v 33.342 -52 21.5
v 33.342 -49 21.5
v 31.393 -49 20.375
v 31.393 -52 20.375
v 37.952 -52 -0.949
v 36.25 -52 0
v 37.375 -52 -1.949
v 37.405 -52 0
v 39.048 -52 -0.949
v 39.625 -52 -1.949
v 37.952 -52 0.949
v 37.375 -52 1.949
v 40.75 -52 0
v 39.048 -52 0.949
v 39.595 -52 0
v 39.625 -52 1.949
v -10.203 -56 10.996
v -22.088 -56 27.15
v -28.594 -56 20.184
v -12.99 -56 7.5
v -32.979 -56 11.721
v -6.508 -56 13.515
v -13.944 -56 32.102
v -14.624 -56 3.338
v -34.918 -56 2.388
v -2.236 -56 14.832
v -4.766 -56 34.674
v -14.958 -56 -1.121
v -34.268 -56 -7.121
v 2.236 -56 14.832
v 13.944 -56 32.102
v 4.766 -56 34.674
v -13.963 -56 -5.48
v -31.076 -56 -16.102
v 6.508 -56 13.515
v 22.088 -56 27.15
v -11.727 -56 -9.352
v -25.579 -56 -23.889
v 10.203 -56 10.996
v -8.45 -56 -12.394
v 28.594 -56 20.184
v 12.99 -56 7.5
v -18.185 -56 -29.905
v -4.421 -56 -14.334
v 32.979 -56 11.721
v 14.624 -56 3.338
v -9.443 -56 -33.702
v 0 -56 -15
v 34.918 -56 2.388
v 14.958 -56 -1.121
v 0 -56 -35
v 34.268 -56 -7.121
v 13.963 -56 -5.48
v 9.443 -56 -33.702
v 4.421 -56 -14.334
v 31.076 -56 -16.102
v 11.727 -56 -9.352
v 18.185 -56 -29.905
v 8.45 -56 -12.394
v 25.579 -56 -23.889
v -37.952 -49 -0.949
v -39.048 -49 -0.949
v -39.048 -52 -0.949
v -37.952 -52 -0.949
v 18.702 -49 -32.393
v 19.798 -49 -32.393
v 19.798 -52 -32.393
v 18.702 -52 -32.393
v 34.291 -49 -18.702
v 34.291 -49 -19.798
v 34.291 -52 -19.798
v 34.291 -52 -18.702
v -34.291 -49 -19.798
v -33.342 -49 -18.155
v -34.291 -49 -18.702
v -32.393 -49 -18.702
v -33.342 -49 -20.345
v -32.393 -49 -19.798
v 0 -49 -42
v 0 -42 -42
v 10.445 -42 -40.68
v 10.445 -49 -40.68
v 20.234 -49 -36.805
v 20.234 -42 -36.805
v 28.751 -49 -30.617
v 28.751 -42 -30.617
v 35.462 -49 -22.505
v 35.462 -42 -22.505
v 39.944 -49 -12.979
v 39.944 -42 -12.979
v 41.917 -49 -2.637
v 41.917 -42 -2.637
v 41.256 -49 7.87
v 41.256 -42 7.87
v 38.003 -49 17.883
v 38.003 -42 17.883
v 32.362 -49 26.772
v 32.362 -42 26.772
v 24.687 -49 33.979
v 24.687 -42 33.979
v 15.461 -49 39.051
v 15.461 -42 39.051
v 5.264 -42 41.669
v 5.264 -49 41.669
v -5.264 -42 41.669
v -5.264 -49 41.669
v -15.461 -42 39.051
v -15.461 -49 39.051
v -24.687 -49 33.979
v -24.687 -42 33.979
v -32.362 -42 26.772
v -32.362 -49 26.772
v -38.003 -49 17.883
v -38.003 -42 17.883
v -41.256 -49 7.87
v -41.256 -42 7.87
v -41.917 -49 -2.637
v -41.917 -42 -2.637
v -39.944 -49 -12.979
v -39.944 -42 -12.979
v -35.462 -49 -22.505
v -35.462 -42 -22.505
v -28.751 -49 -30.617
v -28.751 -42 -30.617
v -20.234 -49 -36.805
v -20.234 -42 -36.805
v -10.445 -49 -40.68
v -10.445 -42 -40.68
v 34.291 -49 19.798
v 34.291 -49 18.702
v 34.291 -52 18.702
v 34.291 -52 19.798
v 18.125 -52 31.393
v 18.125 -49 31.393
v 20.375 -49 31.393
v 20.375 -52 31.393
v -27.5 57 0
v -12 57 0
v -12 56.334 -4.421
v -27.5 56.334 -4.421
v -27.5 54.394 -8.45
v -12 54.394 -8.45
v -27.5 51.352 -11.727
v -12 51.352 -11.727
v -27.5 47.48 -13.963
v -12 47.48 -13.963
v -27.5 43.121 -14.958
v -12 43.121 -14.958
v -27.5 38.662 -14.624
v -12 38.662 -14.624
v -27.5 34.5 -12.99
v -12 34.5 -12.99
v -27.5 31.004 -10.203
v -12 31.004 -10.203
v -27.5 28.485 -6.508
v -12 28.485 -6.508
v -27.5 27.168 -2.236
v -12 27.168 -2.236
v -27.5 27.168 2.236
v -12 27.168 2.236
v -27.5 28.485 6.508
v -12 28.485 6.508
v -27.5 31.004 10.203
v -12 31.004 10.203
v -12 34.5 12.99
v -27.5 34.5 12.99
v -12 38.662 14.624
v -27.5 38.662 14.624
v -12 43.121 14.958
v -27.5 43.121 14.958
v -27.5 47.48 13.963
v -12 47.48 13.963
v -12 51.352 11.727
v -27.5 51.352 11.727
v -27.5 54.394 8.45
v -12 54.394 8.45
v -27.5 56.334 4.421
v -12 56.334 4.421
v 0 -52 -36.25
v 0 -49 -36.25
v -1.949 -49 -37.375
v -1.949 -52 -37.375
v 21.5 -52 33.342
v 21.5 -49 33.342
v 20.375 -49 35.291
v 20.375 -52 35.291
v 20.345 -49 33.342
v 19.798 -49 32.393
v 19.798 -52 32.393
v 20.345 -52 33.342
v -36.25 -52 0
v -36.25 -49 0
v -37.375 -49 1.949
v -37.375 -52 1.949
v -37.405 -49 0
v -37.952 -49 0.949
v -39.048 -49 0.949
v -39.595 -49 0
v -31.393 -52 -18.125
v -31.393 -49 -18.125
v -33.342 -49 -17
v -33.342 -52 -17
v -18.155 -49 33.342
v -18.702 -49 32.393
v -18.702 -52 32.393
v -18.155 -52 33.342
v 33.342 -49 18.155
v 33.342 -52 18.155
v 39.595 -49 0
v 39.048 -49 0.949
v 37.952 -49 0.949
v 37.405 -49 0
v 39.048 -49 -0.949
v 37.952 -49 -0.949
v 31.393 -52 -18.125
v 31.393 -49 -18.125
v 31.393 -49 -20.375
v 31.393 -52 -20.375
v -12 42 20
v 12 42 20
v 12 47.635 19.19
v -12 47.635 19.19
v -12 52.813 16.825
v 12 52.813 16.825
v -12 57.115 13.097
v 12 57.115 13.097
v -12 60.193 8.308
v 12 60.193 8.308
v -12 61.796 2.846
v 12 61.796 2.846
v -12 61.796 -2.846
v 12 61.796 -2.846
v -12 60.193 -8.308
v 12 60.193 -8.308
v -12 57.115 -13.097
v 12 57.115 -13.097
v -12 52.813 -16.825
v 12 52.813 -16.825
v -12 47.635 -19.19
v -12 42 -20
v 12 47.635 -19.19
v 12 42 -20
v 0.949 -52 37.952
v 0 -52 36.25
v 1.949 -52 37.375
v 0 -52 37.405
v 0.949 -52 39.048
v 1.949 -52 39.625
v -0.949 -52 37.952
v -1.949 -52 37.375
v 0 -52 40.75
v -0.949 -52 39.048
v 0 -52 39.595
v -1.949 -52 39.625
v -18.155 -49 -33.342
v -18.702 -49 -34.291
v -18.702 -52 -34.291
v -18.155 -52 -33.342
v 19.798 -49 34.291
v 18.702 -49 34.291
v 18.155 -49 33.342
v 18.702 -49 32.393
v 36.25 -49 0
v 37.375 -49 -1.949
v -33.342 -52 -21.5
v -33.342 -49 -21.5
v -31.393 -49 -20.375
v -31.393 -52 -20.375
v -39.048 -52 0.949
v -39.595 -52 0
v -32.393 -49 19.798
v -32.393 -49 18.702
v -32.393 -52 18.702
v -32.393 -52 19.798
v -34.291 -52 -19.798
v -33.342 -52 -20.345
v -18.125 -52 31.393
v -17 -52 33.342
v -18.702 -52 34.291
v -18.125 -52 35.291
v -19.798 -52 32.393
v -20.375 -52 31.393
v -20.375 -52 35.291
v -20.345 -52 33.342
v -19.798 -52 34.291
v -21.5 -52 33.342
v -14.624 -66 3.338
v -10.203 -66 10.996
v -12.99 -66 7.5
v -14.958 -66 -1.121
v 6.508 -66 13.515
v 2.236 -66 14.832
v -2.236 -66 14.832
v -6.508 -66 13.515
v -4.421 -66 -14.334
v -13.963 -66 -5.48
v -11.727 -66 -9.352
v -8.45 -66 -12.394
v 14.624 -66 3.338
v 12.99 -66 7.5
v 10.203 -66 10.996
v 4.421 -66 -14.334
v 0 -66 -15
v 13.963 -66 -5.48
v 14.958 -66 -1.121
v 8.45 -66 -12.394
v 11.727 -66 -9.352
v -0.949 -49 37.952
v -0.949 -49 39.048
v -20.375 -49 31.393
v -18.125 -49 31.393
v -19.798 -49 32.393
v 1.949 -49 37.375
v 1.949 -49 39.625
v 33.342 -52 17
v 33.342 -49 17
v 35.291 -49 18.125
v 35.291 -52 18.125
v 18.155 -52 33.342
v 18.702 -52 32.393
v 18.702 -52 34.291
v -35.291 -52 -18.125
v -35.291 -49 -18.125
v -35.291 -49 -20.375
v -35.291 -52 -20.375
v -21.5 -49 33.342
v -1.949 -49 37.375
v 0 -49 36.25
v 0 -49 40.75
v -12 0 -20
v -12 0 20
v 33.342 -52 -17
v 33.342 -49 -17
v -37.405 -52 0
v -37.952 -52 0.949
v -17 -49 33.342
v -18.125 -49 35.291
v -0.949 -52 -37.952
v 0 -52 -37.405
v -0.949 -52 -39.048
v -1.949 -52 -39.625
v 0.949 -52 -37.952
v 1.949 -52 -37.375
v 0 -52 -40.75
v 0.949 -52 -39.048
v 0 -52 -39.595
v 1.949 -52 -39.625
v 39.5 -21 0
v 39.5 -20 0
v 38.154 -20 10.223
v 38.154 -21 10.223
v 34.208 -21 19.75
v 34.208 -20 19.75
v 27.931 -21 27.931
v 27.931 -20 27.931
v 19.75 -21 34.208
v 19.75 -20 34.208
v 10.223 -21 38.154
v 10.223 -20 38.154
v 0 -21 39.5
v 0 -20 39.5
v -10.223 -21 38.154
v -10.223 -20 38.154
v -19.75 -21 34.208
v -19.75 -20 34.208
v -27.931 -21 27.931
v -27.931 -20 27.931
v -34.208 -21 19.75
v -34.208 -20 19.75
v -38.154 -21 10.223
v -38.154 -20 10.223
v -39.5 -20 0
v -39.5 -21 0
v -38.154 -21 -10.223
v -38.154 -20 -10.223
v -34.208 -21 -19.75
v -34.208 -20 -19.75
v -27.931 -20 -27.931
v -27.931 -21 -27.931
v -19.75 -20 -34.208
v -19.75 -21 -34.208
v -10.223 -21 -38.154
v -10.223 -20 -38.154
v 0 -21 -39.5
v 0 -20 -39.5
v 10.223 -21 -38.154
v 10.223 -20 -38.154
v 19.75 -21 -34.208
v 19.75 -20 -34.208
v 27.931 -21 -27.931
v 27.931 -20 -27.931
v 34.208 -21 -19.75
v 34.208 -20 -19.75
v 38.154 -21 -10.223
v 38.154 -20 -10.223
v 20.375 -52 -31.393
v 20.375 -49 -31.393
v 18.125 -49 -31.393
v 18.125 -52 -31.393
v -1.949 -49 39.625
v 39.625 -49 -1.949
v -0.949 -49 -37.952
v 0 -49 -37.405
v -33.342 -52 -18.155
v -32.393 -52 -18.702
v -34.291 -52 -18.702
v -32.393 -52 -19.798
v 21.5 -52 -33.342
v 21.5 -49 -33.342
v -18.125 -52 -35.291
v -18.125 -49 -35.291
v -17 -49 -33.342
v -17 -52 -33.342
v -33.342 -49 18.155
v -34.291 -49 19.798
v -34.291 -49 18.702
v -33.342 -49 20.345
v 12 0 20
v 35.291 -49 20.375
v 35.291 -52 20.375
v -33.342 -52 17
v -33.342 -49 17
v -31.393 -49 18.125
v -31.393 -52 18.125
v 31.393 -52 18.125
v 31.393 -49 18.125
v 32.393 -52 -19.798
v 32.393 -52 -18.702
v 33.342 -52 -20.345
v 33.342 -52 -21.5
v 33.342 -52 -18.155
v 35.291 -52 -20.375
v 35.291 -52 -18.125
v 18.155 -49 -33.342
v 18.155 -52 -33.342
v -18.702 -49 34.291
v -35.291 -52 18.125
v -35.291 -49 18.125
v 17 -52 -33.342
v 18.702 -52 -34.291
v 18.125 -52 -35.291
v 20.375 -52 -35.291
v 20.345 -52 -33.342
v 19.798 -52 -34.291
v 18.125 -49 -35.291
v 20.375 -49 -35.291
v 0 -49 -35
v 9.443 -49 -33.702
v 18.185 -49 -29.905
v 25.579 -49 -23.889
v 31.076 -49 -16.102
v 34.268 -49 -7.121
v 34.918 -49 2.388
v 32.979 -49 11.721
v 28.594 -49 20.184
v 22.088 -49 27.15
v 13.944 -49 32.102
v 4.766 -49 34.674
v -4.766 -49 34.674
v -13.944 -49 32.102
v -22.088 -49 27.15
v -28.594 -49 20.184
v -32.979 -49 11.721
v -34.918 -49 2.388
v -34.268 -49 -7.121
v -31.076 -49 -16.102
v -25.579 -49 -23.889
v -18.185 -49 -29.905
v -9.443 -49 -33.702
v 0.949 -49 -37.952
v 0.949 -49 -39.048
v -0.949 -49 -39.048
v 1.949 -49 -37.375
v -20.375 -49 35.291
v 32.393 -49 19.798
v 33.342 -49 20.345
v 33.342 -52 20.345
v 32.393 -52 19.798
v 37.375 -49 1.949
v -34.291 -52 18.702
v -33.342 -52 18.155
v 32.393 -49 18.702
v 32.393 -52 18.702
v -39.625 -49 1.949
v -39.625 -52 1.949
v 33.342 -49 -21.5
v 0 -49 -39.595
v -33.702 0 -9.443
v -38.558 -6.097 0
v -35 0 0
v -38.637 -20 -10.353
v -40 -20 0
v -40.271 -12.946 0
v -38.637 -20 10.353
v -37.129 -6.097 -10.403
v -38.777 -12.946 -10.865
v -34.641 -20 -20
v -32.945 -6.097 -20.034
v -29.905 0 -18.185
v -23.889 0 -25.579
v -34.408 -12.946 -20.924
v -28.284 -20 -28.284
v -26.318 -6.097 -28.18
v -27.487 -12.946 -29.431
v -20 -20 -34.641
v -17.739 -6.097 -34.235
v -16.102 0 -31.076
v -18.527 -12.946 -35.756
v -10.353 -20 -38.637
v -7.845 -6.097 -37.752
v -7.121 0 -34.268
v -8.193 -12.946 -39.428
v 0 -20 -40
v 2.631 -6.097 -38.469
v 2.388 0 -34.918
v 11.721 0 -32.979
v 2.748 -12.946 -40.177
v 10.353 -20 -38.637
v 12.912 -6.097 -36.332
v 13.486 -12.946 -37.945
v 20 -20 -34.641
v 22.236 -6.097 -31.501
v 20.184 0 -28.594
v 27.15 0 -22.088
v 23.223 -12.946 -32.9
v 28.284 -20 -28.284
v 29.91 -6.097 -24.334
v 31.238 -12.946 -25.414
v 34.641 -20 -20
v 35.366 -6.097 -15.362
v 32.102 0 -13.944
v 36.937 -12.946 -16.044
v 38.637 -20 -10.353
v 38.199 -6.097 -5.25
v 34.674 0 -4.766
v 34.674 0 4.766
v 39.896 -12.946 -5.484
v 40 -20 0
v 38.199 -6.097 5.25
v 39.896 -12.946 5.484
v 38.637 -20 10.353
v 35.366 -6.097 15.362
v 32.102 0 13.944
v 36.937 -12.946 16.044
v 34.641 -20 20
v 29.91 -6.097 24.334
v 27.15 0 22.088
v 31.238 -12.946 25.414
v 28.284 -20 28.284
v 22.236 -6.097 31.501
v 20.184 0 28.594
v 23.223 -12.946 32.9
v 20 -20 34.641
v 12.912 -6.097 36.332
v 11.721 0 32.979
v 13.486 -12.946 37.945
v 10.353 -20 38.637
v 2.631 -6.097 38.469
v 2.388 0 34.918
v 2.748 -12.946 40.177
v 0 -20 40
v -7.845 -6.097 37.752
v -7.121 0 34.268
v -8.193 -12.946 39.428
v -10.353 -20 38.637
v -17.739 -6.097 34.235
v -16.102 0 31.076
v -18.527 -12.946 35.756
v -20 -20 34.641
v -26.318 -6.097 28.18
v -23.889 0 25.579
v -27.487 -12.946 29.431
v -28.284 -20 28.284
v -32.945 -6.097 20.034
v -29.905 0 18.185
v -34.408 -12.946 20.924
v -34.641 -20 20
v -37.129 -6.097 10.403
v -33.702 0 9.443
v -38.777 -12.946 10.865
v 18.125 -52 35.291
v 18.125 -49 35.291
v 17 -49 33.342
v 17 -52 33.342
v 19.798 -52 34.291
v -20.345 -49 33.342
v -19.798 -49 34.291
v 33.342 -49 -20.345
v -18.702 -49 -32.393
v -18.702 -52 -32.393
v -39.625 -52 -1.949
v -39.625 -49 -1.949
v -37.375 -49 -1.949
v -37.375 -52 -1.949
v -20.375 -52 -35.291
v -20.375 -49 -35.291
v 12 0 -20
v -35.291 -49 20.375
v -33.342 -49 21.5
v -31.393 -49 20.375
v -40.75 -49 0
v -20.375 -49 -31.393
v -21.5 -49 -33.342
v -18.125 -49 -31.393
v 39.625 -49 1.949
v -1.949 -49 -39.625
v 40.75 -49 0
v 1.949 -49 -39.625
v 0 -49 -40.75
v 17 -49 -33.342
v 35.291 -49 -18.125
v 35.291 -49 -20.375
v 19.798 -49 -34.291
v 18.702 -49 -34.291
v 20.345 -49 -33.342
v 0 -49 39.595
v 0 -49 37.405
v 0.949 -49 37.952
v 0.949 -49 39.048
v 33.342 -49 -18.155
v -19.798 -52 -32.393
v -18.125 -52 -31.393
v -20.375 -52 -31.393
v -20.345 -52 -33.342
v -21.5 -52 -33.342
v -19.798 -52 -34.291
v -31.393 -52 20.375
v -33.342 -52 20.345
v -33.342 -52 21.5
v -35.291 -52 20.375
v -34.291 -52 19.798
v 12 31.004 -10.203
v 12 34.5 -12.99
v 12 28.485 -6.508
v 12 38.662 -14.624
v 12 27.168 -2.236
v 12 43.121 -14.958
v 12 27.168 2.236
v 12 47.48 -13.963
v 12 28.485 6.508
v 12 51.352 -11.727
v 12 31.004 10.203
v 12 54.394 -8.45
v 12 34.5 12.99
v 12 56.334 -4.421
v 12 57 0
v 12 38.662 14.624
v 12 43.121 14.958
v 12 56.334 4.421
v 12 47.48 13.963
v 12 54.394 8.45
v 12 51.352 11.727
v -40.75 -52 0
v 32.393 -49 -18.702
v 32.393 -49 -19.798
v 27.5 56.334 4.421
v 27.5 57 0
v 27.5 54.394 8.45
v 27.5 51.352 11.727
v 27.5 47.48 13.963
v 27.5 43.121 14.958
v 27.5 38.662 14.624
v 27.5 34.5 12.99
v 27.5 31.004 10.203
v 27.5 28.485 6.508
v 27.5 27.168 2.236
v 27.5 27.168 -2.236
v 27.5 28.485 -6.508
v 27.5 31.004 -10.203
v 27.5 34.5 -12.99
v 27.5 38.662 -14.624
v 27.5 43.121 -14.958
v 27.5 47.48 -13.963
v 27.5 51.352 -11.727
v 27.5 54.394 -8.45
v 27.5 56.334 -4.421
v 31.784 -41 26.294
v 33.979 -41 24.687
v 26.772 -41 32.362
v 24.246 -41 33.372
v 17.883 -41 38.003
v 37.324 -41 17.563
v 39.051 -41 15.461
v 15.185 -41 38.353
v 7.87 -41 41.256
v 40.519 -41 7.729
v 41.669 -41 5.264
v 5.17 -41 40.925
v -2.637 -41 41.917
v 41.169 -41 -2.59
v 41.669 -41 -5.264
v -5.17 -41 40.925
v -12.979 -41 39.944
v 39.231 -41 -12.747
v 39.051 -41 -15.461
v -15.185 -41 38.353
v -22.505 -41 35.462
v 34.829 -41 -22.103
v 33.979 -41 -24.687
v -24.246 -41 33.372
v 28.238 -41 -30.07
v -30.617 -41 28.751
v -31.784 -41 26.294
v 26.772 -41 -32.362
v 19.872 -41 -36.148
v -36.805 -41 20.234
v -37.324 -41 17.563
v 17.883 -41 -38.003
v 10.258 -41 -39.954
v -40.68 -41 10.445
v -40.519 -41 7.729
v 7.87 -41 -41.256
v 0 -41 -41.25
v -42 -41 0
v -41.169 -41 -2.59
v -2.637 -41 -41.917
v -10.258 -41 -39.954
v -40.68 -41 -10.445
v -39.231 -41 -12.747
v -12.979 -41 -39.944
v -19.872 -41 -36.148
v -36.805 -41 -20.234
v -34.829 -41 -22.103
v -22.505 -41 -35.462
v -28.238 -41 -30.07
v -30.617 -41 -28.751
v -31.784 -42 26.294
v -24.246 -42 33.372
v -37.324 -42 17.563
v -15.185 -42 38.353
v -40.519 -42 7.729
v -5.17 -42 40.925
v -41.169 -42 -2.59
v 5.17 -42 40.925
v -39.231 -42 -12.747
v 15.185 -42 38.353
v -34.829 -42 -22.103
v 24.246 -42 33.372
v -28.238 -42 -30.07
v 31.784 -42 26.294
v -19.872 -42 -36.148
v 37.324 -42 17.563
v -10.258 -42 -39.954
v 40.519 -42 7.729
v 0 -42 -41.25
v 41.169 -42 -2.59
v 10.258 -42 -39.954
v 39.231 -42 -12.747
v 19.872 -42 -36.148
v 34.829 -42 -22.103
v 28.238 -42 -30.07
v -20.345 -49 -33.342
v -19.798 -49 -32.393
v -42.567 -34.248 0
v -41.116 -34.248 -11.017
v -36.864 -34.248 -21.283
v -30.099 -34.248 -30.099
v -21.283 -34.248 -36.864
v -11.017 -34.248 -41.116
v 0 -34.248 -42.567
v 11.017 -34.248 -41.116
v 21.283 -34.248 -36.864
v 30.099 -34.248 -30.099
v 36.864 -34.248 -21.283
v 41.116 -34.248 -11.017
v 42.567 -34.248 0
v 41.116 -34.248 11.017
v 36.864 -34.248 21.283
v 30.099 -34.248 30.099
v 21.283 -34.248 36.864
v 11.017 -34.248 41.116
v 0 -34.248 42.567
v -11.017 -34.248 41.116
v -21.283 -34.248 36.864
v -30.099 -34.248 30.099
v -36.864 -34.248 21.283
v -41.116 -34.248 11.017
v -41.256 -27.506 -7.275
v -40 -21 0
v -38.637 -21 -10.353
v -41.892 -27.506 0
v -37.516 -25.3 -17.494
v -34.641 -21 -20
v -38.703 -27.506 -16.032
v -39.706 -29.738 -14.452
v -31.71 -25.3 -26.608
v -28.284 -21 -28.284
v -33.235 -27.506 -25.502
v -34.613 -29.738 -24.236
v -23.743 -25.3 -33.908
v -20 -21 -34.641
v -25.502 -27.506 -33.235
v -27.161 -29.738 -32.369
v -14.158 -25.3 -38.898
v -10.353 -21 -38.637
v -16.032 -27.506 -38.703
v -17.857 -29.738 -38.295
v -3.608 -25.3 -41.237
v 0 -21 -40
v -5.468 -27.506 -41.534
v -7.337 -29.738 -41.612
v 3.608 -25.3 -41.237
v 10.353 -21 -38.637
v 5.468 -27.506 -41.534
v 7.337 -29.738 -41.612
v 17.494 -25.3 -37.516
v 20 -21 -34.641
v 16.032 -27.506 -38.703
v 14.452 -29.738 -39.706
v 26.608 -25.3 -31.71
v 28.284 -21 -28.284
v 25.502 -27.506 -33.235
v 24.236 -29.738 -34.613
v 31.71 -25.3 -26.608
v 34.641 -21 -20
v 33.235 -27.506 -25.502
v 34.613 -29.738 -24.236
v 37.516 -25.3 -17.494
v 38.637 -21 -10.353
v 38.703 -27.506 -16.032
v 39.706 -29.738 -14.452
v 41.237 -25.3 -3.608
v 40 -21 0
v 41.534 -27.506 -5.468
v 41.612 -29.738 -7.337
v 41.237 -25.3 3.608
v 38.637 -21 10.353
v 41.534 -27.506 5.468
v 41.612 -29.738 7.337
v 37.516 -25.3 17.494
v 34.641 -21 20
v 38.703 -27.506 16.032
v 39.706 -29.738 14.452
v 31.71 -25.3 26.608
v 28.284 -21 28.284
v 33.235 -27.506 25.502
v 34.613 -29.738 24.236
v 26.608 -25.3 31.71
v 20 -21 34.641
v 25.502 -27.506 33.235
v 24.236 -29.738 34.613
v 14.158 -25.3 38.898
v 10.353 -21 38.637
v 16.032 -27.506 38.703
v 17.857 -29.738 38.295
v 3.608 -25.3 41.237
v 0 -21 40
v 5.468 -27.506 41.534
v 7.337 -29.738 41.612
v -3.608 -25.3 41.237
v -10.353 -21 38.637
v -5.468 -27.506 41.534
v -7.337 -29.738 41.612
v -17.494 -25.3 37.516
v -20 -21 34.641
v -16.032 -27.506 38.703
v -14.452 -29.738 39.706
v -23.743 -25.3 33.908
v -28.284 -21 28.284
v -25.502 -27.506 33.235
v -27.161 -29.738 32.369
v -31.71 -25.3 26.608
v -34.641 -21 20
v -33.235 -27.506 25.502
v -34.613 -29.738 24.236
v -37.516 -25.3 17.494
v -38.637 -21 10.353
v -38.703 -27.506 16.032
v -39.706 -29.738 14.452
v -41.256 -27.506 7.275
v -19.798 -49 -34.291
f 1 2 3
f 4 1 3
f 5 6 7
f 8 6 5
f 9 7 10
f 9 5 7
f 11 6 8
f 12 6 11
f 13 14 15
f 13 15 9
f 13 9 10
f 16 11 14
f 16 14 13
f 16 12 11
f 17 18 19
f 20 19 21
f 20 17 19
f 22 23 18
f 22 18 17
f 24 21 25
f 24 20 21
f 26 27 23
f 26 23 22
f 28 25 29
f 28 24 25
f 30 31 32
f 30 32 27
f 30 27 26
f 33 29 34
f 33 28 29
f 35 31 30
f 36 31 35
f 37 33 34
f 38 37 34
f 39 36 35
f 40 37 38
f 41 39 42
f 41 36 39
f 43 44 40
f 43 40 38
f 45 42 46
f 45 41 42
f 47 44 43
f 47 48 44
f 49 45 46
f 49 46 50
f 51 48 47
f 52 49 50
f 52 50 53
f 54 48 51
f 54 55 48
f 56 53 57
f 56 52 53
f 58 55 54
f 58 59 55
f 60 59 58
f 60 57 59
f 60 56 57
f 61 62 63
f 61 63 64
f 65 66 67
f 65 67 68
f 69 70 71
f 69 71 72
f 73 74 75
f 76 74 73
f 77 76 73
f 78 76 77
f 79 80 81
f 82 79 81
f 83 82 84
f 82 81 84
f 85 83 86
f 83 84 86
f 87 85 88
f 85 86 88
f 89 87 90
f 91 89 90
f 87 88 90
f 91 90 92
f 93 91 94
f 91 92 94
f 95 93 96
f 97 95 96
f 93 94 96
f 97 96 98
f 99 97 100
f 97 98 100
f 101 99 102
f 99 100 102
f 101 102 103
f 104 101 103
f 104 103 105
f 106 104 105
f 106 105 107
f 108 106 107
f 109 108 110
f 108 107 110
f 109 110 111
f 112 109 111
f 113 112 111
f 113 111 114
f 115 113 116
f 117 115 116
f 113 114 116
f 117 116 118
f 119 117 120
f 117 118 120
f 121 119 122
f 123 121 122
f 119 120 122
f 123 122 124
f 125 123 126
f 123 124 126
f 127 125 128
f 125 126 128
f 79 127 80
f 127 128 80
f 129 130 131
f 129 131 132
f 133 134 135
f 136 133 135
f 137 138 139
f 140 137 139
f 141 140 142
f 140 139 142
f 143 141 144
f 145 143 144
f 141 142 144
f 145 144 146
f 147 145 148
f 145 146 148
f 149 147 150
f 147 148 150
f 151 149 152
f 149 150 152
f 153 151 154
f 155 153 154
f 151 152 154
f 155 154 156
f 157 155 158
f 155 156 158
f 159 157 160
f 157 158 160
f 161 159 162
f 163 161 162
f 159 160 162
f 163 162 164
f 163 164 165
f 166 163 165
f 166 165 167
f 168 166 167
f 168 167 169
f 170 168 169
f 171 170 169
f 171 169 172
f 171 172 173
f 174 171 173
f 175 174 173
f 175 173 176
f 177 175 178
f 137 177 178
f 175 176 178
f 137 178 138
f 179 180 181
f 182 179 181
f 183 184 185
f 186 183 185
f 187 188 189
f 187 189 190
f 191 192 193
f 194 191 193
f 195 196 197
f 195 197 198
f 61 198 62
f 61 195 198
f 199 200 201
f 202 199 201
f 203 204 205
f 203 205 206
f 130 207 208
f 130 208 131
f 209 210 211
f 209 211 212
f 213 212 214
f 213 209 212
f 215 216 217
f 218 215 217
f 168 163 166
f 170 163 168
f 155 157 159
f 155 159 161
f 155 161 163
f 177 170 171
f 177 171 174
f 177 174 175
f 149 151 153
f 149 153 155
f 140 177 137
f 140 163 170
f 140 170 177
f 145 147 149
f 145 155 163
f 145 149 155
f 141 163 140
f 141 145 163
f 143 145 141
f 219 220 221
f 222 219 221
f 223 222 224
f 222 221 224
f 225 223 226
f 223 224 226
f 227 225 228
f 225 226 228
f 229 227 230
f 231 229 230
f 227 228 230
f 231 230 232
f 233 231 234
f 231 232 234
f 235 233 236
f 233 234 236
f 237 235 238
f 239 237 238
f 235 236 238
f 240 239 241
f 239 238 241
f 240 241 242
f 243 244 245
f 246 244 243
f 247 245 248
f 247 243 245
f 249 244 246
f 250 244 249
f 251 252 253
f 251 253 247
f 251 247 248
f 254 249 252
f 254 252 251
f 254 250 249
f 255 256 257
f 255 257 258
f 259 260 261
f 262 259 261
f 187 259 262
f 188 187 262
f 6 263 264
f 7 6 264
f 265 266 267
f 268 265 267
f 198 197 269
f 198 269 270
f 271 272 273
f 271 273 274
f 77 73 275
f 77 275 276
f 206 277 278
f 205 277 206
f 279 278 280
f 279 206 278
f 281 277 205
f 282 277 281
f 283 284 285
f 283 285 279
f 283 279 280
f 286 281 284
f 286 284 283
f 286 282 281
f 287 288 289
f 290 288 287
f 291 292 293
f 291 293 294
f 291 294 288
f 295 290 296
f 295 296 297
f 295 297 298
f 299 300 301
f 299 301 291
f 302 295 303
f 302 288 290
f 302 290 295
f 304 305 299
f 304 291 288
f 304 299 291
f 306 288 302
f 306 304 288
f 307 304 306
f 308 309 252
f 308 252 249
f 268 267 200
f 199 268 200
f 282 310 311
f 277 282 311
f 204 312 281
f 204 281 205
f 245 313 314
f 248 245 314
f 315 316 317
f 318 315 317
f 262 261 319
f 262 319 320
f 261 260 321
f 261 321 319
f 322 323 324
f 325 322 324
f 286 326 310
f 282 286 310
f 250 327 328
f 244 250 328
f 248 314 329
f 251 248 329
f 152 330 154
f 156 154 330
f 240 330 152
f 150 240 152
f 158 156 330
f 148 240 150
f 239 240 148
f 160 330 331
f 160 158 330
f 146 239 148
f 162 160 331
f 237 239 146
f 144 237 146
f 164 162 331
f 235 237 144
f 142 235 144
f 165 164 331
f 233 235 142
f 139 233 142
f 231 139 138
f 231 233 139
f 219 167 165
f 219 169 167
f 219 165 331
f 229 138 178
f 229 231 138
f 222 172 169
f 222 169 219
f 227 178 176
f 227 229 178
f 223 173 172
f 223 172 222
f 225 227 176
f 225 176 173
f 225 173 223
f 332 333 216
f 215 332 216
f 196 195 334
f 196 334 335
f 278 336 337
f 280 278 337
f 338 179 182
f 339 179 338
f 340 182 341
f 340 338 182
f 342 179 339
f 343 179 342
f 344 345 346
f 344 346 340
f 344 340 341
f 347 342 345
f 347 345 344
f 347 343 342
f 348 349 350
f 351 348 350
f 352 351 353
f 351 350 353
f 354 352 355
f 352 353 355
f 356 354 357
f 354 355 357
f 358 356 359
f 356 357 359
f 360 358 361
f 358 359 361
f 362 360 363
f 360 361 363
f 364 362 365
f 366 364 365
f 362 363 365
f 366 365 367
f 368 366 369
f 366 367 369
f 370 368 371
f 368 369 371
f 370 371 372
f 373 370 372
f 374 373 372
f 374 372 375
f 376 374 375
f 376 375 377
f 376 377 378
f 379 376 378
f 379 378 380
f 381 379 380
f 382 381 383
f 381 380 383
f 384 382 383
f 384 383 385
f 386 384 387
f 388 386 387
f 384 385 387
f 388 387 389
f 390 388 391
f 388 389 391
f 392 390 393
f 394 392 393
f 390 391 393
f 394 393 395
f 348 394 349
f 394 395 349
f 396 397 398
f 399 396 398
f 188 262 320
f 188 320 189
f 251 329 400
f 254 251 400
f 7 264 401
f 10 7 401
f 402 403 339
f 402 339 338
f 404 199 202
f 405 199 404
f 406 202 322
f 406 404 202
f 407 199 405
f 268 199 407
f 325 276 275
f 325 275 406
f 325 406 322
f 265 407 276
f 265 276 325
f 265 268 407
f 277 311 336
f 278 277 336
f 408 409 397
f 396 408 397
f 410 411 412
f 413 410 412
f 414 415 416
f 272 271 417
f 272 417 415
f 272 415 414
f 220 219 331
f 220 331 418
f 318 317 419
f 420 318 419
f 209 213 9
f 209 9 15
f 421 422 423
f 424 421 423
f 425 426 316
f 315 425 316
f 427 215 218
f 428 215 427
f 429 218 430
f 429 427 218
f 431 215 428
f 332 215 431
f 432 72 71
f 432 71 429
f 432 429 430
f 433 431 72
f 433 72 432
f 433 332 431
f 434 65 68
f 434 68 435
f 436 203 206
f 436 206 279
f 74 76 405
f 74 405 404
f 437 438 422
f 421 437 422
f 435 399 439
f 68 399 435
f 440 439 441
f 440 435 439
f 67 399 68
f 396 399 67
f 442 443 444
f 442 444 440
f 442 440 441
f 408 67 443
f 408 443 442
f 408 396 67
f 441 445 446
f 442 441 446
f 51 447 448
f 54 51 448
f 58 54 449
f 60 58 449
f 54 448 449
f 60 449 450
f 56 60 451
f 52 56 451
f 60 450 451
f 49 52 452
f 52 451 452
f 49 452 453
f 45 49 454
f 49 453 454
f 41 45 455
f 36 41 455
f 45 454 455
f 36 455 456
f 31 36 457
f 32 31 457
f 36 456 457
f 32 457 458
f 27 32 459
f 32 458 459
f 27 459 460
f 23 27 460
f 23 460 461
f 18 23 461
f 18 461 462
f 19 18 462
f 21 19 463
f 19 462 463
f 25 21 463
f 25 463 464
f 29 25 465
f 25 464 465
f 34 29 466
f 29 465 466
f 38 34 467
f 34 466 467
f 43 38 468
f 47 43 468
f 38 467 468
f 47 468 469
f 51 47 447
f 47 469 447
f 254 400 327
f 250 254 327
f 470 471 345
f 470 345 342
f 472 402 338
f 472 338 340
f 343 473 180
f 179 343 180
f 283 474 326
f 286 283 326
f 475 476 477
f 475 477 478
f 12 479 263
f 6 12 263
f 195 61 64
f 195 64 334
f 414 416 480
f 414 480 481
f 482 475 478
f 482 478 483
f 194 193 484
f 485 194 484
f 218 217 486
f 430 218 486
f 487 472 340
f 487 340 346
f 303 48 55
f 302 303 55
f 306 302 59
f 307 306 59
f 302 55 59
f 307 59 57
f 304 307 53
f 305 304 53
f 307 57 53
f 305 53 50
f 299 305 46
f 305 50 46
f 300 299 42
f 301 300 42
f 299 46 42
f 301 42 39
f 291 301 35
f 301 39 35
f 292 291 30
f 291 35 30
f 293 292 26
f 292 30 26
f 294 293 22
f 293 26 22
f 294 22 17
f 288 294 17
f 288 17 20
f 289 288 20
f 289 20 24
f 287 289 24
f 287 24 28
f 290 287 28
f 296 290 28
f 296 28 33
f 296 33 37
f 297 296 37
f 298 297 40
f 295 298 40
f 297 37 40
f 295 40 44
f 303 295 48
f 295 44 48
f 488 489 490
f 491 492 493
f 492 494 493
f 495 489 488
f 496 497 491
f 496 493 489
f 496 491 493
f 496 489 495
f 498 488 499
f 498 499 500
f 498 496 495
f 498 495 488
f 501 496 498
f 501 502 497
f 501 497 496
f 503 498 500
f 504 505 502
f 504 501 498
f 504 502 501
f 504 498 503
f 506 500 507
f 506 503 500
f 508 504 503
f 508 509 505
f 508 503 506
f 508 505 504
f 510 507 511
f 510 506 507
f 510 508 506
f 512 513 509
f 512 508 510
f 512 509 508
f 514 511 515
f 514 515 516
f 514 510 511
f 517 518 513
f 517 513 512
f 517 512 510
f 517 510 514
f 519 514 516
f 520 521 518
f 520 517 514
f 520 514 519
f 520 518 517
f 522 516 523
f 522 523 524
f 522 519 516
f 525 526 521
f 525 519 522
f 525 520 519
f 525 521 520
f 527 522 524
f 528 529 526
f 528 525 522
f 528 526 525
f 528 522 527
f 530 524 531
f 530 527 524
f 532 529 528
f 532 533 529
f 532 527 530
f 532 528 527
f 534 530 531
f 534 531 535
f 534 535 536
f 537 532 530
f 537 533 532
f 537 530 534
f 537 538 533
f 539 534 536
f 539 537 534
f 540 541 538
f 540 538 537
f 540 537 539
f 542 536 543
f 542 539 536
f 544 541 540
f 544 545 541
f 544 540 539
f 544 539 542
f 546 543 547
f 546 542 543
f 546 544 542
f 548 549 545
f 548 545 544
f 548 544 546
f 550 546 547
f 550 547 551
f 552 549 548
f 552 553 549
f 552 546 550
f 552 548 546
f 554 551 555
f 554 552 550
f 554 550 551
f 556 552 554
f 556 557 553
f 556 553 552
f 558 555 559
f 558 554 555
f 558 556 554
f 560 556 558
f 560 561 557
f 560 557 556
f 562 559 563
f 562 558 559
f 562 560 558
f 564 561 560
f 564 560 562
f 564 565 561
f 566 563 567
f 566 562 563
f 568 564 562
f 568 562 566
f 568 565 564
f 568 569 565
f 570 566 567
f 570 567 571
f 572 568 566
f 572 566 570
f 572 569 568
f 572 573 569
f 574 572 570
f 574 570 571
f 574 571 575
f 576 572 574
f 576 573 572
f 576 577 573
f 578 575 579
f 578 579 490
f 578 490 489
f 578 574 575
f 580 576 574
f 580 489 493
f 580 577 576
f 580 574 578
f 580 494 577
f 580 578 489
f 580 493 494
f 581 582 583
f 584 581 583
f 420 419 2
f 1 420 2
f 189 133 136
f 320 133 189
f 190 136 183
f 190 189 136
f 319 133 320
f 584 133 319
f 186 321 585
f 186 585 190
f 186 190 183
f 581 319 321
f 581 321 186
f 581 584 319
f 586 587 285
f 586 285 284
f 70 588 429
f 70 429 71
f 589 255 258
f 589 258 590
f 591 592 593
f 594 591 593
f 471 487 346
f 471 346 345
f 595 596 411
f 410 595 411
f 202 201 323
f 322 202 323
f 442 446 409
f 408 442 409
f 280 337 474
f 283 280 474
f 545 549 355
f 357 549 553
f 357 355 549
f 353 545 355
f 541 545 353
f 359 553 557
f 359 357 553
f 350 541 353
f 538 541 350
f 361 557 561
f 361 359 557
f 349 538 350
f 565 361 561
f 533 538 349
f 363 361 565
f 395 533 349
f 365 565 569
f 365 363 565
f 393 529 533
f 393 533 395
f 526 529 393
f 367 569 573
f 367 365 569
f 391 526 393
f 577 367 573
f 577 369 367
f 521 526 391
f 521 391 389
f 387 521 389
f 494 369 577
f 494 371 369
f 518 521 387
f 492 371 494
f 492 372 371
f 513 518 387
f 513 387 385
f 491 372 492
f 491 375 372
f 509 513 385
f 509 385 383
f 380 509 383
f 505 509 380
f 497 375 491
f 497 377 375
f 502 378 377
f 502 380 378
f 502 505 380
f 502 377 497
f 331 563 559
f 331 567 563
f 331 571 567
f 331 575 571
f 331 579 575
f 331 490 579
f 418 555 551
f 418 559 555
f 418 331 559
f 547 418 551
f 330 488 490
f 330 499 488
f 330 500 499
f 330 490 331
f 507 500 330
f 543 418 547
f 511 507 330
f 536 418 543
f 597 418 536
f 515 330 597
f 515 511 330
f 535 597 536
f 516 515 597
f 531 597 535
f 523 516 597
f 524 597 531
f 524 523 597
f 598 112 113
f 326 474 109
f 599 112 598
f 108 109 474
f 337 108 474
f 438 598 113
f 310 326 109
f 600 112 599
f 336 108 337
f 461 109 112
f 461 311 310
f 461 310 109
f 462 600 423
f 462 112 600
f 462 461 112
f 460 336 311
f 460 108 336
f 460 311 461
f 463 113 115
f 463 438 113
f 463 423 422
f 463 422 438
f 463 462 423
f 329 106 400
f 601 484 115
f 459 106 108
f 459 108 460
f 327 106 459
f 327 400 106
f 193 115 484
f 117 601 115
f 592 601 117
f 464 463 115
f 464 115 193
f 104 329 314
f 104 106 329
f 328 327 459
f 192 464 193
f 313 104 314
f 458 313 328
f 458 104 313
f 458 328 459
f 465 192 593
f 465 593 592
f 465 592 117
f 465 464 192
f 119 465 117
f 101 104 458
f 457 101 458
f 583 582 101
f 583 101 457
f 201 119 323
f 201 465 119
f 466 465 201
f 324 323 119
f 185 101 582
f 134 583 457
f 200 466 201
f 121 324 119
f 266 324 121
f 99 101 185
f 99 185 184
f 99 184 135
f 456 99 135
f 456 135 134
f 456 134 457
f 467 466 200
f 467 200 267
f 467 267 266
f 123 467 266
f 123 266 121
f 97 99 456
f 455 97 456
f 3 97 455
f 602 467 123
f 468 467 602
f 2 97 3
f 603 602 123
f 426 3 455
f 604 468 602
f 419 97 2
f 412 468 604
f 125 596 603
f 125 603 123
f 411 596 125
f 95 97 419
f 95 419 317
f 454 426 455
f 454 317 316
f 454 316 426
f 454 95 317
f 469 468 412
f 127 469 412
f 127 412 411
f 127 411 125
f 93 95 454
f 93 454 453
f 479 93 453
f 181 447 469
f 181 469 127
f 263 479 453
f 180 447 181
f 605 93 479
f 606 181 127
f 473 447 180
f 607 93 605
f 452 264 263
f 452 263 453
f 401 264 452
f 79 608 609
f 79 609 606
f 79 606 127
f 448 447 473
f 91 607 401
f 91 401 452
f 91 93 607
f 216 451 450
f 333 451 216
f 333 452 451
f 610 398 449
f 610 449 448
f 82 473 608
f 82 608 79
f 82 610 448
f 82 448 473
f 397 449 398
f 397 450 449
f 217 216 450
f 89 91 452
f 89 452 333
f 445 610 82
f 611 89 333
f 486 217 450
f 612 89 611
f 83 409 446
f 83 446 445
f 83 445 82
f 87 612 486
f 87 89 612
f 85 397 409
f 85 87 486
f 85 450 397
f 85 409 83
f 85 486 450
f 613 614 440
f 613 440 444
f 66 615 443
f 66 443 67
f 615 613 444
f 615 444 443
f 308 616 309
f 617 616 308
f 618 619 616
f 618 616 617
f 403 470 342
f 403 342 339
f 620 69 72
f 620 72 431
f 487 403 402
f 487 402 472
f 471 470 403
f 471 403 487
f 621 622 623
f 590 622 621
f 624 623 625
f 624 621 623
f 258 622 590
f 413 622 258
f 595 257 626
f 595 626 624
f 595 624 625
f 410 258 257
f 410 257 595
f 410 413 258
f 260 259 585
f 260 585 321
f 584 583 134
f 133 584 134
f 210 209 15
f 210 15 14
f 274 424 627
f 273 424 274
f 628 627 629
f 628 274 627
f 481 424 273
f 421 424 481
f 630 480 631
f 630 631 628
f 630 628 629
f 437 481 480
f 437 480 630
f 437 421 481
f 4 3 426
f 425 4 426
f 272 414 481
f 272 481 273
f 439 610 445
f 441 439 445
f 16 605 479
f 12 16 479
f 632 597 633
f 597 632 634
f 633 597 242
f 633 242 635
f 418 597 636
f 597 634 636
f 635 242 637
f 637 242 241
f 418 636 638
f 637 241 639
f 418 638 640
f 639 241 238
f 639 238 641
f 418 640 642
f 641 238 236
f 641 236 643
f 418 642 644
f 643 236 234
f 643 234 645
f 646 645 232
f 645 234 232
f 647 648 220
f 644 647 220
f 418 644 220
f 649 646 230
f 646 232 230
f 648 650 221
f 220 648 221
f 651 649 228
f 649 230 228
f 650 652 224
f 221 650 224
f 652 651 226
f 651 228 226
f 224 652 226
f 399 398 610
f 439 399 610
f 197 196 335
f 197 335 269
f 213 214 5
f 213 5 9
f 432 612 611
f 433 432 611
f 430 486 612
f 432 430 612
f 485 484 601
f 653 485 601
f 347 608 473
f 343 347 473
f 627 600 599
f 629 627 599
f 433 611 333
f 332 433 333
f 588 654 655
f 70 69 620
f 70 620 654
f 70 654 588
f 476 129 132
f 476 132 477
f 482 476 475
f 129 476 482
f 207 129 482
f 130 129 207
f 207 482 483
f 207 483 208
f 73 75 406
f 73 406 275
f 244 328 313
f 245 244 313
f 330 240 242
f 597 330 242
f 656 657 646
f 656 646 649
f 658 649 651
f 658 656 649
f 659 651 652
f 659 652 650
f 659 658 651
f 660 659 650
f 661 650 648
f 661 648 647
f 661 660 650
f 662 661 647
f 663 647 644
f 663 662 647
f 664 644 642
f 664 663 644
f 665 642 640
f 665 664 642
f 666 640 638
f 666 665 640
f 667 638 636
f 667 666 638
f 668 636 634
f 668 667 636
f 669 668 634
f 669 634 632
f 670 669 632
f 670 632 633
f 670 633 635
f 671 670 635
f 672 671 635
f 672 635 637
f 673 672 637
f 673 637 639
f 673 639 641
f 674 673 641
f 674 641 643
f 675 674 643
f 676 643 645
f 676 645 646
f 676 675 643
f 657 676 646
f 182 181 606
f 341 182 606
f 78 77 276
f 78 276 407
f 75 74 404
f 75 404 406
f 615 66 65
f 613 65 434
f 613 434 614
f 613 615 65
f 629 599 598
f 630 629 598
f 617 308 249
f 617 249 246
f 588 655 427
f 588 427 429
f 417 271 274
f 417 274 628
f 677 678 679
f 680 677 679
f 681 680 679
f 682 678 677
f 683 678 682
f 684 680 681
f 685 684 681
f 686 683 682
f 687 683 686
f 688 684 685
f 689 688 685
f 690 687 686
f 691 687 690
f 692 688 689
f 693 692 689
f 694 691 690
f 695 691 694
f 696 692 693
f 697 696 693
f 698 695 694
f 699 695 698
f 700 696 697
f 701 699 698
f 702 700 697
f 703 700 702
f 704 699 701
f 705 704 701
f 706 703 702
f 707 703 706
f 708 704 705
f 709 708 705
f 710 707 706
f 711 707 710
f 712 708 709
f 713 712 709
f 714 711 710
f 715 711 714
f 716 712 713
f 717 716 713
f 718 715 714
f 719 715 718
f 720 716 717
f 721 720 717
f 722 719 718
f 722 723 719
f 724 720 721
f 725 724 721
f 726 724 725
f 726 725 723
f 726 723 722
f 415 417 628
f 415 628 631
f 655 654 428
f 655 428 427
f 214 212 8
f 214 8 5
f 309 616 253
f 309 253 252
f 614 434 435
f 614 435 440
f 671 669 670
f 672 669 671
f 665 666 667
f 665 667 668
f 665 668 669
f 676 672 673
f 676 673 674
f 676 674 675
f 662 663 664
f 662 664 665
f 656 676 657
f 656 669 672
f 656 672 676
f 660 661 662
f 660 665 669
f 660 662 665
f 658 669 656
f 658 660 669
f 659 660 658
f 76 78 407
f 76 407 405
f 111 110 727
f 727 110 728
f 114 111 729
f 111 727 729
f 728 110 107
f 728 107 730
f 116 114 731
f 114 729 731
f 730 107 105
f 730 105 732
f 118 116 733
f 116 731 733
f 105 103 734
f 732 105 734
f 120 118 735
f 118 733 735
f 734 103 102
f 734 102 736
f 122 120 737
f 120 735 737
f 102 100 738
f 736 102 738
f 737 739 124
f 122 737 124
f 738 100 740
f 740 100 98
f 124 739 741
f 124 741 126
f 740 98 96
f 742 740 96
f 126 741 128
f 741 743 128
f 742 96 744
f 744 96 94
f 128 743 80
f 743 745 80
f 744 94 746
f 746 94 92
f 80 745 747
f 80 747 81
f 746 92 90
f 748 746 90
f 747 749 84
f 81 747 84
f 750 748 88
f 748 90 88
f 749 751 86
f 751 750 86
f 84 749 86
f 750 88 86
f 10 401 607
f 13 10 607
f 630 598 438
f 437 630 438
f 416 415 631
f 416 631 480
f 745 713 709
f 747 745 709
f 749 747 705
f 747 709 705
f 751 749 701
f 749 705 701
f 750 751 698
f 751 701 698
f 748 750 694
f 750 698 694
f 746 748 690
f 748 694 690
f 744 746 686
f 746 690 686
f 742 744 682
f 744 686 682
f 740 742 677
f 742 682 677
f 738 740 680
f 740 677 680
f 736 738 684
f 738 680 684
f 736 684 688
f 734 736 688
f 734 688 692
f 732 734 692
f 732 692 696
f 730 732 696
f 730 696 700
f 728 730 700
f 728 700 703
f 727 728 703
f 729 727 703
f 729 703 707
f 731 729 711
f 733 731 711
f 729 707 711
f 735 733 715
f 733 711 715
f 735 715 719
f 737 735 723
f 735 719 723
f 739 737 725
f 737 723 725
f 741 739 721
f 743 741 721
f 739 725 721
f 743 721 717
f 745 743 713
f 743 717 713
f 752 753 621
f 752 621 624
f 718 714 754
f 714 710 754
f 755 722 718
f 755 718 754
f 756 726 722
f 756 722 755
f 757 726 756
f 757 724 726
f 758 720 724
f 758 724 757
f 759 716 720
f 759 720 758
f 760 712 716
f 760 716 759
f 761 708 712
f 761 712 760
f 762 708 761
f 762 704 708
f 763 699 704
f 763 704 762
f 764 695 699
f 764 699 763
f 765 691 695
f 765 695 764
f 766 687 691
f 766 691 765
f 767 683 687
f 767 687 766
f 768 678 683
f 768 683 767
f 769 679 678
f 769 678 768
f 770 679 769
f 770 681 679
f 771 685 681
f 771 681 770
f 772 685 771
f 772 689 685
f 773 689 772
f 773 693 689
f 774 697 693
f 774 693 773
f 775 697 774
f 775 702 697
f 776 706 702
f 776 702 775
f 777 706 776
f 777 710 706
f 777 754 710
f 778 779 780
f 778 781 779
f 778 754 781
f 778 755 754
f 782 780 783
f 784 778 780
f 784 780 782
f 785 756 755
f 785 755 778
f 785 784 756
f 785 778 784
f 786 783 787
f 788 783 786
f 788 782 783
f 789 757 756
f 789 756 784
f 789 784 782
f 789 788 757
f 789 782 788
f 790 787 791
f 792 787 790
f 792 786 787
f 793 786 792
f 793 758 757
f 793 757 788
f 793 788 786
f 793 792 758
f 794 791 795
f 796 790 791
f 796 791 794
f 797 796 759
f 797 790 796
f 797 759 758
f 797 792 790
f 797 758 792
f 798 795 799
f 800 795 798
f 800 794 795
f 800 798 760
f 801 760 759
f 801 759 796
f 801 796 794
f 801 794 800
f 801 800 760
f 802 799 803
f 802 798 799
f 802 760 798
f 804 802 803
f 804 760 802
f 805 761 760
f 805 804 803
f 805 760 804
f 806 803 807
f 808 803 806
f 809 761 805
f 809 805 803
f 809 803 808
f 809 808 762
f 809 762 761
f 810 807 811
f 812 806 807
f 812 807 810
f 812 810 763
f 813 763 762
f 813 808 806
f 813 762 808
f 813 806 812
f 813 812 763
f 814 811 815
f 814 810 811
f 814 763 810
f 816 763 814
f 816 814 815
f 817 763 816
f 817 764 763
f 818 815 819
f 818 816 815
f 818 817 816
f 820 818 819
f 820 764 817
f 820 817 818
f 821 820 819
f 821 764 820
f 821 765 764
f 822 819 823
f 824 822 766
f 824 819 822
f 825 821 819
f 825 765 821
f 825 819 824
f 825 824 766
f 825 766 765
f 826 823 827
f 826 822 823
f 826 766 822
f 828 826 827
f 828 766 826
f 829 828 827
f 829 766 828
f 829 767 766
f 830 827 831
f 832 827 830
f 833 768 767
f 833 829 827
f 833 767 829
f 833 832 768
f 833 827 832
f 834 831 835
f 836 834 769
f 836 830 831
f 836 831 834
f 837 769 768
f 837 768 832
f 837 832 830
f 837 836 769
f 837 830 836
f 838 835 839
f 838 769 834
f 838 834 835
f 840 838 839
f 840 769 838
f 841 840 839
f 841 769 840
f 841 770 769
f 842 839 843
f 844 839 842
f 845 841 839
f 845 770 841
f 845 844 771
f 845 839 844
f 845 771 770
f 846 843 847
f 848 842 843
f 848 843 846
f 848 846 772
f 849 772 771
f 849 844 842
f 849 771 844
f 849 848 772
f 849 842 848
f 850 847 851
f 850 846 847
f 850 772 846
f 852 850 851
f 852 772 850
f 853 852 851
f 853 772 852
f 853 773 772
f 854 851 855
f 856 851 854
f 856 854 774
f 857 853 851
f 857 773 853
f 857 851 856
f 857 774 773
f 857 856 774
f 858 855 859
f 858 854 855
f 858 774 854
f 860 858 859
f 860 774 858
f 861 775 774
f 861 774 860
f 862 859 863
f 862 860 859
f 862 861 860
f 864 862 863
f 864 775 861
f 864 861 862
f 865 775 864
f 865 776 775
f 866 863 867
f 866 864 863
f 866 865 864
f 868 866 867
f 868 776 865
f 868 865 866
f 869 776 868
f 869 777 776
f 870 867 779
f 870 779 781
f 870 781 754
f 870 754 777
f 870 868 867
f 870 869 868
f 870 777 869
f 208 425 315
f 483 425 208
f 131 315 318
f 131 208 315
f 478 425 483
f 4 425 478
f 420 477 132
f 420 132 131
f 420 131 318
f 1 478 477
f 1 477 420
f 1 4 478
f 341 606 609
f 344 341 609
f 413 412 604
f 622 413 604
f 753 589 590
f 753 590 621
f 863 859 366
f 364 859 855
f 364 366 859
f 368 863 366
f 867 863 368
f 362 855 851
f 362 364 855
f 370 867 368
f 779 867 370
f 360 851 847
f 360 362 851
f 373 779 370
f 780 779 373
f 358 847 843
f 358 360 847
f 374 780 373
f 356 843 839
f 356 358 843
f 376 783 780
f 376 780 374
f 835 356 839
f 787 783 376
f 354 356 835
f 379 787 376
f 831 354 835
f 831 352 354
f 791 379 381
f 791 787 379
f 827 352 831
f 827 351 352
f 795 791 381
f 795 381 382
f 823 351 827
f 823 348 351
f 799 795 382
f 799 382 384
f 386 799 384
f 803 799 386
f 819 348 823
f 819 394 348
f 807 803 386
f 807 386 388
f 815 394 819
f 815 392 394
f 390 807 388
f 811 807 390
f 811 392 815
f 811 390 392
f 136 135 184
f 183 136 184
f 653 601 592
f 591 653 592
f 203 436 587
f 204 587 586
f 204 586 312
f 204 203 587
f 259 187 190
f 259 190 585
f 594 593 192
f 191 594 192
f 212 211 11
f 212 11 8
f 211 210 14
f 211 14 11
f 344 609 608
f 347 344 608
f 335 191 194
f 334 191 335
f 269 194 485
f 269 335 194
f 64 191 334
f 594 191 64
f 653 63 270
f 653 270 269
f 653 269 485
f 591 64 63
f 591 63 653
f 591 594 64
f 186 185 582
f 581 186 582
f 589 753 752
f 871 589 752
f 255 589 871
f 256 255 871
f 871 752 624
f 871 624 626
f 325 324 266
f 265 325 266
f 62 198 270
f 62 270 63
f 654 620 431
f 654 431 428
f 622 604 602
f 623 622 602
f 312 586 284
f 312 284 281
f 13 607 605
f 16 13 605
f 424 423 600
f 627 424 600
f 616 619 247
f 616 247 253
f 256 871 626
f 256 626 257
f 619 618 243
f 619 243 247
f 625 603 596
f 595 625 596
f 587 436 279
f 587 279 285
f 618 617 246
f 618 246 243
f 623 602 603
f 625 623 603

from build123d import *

# Parameters (mm, degrees)
SKETCH2_R            = 39.5
BOSS_EXTRUDE1_DEPTH  = 1
SKETCH4_R            = 41.25
BOSS_EXTRUDE2_DEPTH  = 1
SKETCH5_R            = 42
BOSS_EXTRUDE3_DEPTH  = 7
SKETCH6_R            = 35
BOSS_EXTRUDE4_DEPTH  = 7
BOSS_EXTRUDE7_DEPTH  = 3
CIRPATTERN2_COUNT    = 12
SKETCH8_R            = 15
BOSS_EXTRUDE8_DEPTH  = 10
SKETCH9_W            = 24
SKETCH9_H            = 40
BOSS_EXTRUDE9_DEPTH  = 42
BOSS_EXTRUDE10_START = -24
BOSS_EXTRUDE10_DEPTH = 24
SKETCH11_R           = 15
BOSS_EXTRUDE11_DEPTH = 15.5
BOSS_EXTRUDE12_START = 15.5
SKETCH12_R           = 15
BOSS_EXTRUDE12_DEPTH = 15.5


with BuildPart() as part:
    # Sketch1 → Revolve1 (revolve)
    with BuildSketch(Plane.XY):
        with BuildLine():
            Line((0, 0), (-35, 0))
            ThreePointArc((-35, 0), (-39.657515479, -9.46062113), (-40, -20))
            Line((-40, -20), (0, -20))
            Line((0, -20), (0, 0))
        make_face()
    revolve(axis=Axis((0, 0, 0), (0, -1, 0)))

    # Sketch2 → Boss-Extrude1 (add)
    with BuildSketch(Plane.XZ.offset(20)):
        Circle(SKETCH2_R)
    extrude(amount=BOSS_EXTRUDE1_DEPTH)

    # Sketch3 → Revolve2 (revolve)
    with BuildSketch(Plane(origin=(0, 0, 0), x_dir=(0, 0, -1), z_dir=(1, 0, 0)), mode=Mode.PRIVATE) as revolve2_sk:
        with BuildLine():
            Line((0, -21), (-40, -21))
            ThreePointArc((-40, -21), (-42.384109041, -30.861589096), (-42, -41))
            Line((-42, -41), (0, -41))
            Line((0, -41), (0, -21))
        make_face()
    revolve(revolve2_sk.sketch.rotate(Axis((0, -21, 0), (0, -1, 0)), 90), axis=Axis((0, -21, 0), (0, -1, 0)))

    # Sketch4 → Boss-Extrude2 (add)
    with BuildSketch(Plane.XZ.offset(41)):
        with Locations(Location((0, 0, 0), (0, 0, 270))):
            Circle(SKETCH4_R)
    extrude(amount=BOSS_EXTRUDE2_DEPTH)

    # Sketch5 → Boss-Extrude3 (add)
    with BuildSketch(Plane.XZ.offset(42)):
        with Locations(Location((0, 0, 0), (0, 0, 270))):
            Circle(SKETCH5_R)
    extrude(amount=BOSS_EXTRUDE3_DEPTH)

    # Sketch6 → Boss-Extrude4 (add)
    with BuildSketch(Plane.XZ.offset(49)):
        with Locations(Location((0, 0, 0), (0, 0, 270))):
            Circle(SKETCH6_R)
    extrude(amount=BOSS_EXTRUDE4_DEPTH)

    # Sketch7 → Boss-Extrude7 (add)
    with BuildSketch(Plane.XZ.offset(49)):
        Polygon((40.75, 0), (39.625, 1.948557159), (37.375, 1.948557159), (36.25, 0), (37.375, -1.948557159), (39.625, -1.948557159), align=None)
        Polygon((39.047649731, 0.948557159), (37.952350269, 0.948557159), (37.404700538, 0), (37.952350269, -0.948557159), (39.047649731, -0.948557159), (39.595299462, 0), align=None, mode=Mode.SUBTRACT)
    boss_extrude7 = extrude(amount=BOSS_EXTRUDE7_DEPTH)

    # CirPattern2: Boss-Extrude7 ×12 about axis
    cirpattern2_axis = Axis((0, 0, 0), (0, 1, 0))
    for i in range(1, CIRPATTERN2_COUNT):
        add(boss_extrude7.rotate(cirpattern2_axis, i * 360 / CIRPATTERN2_COUNT))

    # Sketch8 → Boss-Extrude8 (add)
    with BuildSketch(Plane.XZ.offset(56)):
        with Locations(Location((0, 0, 0), (0, 0, 270))):
            Circle(SKETCH8_R)
    extrude(amount=BOSS_EXTRUDE8_DEPTH)

    # Sketch9 → Boss-Extrude9 (add)
    with BuildSketch(Plane(origin=(0, 0, 0), x_dir=(1, 0, 0), z_dir=(0, 1, 0))):
        Rectangle(SKETCH9_W, SKETCH9_H)
    extrude(amount=BOSS_EXTRUDE9_DEPTH)

    # Sketch10 → Boss-Extrude10 (add)
    with BuildSketch(Plane.ZY.offset(12).offset(BOSS_EXTRUDE10_START)):
        with BuildLine():
            Line((-20, 42), (20, 42))
            ThreePointArc((20, 42), (0, 62), (-20, 42))
        make_face()
    extrude(amount=BOSS_EXTRUDE10_DEPTH)

    # Sketch11 → Boss-Extrude11 (add)
    with BuildSketch(Plane.ZY.offset(12)):
        with Locations(Location((0, 42, 0), (0, 0, 90))):
            Circle(SKETCH11_R)
    extrude(amount=BOSS_EXTRUDE11_DEPTH)

    # Sketch12 → Boss-Extrude12 (add)
    with BuildSketch(Plane(origin=(12, 0, 0), x_dir=(0, 0, -1), z_dir=(1, 0, 0)).offset(BOSS_EXTRUDE12_START)):
        with Locations(Location((0, 42, 0), (0, 0, 90))):
            Circle(SKETCH12_R)
    extrude(amount=-BOSS_EXTRUDE12_DEPTH)


solid = part.part
